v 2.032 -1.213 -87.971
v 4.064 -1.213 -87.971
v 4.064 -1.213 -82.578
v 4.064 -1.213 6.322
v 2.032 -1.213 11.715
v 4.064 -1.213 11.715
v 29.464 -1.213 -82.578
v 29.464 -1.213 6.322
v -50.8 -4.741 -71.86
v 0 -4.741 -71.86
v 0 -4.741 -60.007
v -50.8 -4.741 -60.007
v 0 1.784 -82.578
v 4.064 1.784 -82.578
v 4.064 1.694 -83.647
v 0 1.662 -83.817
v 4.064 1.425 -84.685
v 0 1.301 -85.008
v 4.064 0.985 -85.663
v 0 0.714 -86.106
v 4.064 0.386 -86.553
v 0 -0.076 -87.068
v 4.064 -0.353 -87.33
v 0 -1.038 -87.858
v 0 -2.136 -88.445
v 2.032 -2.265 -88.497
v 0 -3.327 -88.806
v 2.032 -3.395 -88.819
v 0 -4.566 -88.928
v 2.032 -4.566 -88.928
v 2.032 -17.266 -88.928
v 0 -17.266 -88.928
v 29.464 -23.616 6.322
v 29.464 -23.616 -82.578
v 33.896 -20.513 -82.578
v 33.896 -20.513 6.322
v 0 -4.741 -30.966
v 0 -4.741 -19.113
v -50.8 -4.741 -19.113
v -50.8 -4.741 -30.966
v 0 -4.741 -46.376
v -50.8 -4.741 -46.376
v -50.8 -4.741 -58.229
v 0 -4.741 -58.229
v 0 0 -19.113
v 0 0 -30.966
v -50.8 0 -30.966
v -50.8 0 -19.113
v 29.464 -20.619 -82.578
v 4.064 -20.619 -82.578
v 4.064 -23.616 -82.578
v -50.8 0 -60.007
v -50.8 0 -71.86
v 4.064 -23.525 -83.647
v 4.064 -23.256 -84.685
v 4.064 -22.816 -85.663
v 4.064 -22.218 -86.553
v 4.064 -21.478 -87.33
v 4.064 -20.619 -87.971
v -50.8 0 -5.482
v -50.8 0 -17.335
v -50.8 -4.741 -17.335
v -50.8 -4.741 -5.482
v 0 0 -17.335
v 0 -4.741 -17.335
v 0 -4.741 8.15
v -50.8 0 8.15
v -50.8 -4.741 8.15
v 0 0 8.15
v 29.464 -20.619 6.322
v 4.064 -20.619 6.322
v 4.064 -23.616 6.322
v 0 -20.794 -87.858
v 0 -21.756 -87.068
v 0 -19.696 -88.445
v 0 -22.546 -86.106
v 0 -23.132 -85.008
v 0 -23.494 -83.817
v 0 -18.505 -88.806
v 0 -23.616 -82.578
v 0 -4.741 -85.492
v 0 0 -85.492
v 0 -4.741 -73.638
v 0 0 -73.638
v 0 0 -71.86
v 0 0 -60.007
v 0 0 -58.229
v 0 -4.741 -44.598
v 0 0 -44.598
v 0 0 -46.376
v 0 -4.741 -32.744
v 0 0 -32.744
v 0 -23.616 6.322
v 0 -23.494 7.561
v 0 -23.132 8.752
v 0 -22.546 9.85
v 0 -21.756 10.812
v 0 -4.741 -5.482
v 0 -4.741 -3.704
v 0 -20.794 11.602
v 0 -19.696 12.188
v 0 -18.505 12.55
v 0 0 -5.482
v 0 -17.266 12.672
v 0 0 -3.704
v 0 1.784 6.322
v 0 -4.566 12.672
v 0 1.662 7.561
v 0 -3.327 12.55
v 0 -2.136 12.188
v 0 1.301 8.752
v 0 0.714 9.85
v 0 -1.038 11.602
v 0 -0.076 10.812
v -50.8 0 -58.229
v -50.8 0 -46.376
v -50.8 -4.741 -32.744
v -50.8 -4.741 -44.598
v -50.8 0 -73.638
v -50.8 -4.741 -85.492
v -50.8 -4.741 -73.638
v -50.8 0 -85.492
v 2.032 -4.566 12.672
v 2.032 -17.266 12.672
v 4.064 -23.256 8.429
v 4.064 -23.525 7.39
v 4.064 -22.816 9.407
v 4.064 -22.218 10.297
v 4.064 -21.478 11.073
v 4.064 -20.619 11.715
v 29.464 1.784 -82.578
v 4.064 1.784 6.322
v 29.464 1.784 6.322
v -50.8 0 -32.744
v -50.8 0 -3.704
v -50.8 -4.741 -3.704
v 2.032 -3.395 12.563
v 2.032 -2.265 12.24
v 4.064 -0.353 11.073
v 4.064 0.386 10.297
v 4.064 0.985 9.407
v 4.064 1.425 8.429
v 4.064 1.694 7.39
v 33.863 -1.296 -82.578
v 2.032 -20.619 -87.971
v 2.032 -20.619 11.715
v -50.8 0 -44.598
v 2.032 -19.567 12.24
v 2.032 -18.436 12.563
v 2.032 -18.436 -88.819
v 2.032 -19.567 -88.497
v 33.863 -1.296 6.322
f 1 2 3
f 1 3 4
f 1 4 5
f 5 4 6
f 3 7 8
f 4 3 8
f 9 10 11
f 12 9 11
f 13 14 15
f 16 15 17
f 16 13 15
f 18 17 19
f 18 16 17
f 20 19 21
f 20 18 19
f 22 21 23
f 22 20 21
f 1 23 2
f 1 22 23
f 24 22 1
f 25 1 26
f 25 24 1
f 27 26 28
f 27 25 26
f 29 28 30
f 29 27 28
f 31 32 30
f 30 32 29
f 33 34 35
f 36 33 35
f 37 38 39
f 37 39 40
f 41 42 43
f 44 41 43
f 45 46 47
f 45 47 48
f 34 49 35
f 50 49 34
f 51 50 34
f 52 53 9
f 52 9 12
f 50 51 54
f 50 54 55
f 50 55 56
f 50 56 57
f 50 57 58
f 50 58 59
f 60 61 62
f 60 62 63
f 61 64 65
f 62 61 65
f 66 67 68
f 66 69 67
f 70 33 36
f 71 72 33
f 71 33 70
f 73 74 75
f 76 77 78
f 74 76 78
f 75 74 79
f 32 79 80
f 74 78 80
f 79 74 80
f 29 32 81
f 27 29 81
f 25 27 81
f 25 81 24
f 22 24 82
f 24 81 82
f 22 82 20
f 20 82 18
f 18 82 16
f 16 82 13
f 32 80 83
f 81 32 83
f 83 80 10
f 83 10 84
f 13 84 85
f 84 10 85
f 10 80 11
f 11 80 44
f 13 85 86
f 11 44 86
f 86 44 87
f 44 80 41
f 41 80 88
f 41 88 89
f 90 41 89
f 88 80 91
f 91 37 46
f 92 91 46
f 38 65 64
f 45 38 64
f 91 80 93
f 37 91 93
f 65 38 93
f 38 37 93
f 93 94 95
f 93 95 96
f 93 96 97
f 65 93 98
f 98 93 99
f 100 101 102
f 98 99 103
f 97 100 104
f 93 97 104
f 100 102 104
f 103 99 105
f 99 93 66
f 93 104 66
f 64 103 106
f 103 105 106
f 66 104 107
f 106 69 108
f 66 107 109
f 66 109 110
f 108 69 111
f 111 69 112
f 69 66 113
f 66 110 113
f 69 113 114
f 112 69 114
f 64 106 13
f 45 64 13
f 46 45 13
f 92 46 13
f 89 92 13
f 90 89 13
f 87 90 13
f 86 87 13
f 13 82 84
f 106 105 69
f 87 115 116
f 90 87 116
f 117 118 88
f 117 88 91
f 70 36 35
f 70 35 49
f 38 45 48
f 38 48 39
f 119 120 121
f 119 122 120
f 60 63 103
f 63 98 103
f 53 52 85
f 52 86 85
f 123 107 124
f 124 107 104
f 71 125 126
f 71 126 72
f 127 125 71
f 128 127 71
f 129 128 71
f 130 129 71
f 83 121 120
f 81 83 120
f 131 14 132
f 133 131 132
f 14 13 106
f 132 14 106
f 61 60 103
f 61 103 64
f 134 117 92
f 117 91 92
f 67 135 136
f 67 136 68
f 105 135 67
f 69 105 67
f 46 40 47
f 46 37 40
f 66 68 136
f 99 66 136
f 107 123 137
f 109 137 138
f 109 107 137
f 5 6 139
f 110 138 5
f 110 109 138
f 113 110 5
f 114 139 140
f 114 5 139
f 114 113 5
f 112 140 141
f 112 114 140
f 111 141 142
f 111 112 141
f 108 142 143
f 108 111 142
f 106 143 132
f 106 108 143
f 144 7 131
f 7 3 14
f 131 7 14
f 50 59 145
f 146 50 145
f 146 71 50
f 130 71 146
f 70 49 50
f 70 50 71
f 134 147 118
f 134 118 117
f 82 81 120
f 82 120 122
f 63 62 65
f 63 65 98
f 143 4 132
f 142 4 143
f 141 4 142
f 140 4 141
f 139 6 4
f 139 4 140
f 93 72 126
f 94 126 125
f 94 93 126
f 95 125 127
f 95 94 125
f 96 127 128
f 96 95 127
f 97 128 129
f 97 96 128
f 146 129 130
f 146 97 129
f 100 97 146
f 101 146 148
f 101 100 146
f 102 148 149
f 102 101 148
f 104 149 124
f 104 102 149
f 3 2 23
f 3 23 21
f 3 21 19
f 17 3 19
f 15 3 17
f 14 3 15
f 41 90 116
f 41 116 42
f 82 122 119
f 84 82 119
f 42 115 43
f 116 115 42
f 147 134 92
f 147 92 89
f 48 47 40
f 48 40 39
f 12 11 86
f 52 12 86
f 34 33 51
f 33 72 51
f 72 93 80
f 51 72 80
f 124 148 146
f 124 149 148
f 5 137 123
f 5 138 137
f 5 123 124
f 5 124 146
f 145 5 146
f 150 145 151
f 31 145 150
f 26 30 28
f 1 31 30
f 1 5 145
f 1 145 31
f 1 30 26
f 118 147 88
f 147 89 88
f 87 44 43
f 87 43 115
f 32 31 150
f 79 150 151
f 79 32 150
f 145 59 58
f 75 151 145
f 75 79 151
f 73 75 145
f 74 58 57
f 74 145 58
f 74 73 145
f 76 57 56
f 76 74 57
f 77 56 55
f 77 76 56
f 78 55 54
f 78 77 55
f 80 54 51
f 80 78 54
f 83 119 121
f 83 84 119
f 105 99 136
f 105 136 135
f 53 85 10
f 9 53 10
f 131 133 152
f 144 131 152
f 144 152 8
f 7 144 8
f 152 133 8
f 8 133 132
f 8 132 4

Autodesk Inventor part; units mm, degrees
ref_plane "YZ Plane" through (0, 0, 0) normal (1, 0, 0) x (0, 1, 0)
ref_plane "XZ Plane" through (0, 0, 0) normal (0, 1, 0) x (-1, 0, 0)
ref_plane "XY Plane" through (0, 0, 0) normal (0, 0, 1) x (1, 0, 0)
sketch "Sketch1" plane through (0, 0, 0) normal (1, 0, 0) x (0, 1, 0)
  line L0 (-4.5658, 12.6718) -> (-17.2658, 12.6718)
  line L1 (-23.6158, 6.3218) -> (-23.6158, -82.5782)
  line L2 (-17.2658, -88.9282) -> (-4.5658, -88.9282)
  line L3 (1.7842, -82.5782) -> (1.7842, 6.3218)
  arc A0 (1.7842, 6.3218) -> (-4.5658, 12.6718) centre (-4.5658, 6.3218) ccw
  arc A1 (-17.2658, 12.6718) -> (-23.6158, 6.3218) centre (-17.2658, 6.3218) ccw
  arc A2 (-23.6158, -82.5782) -> (-17.2658, -88.9282) centre (-17.2658, -82.5782) ccw
  arc A3 (-4.5658, -88.9282) -> (1.7842, -82.5782) centre (-4.5658, -82.5782) ccw
  point P0 (0, 0)
  point P1 (1.7842, 12.6718)
  point P2 (-23.6158, -88.9282)
  point P3 (-23.6158, 12.6718)
  point P4 (1.7842, -88.9282)
  dimension "d0" = 25.4
  dimension "d1" = 101.6
  dimension "d4" = 6.35
extrude "Extrusion1" add sketch "Sketch1" along normal blind 4.064
sketch "Sketch2" plane through (4.064, 0, 0) normal (1, 0, 0) x (0, 0, -1)
  arc A0 (82.5782, -23.6158) -> (88.9282, -17.2658) centre (82.5782, -17.2658) ccw projected
  line L0 (-12.6718, -4.5658) -> (-12.6718, -17.2658) projected
  line L1 (82.5782, 1.7842) -> (-6.3218, 1.7842) projected
  line L2 (82.5782, -1.213) -> (-6.3218, -1.213)
  line L3 (-6.3218, -20.6186) -> (82.5782, -20.6186)
  line L4 (-6.3218, -20.6186) -> (82.5782, -20.6186)
  line L5 (82.5782, -20.6186) -> (82.5782, -23.6158)
  line L6 (82.5782, -23.6158) -> (-6.3218, -23.6158)
  line L7 (-6.3218, -23.6158) -> (-6.3218, -20.6186)
  line L8 (-6.3218, -1.213) -> (82.5782, -1.213)
  line L9 (82.5782, -1.213) -> (82.5782, 1.7842)
  line L10 (82.5782, 1.7842) -> (-6.3218, 1.7842)
  line L11 (-6.3218, 1.7842) -> (-6.3218, -1.213)
  point P0 (0, 0)
  dimension "d6" = 19.4056
extrude "Extrusion2" add sketch "Sketch2" along normal blind 25.4
sketch "Sketch3" plane through (4.064, -1.213, 6.3218) normal (0, 0, 1) x (1, 0, 0)
  line L0 (25.4, 2.9972) -> (25.4, 0) projected
  line L1 (25.4, 2.9972) -> (25.4, 0)
  line L2 (25.4, -19.4056) -> (25.4, -22.4028) projected
  line L3 (25.4, -22.4028) -> (29.8318, -19.2996)
  line L4 (25.4, -19.4056) -> (25.4, -22.4028)
  line L5 (0, 2.9972) -> (25.4, 2.9972) projected
  line L6 (25.4, 2.9972) -> (25.4, 0)
  line L7 (25.4, 2.9972) -> (29.8318, -0.106)
  line L8 (29.7989, -0.0829) -> (25.4, 0)
  line L9 (29.8318, -19.2996) -> (25.4, -19.4056)
  point P0 (-4.064, 1.213)
  dimension "d35" = 5.4102
  dimension "d36" = 55
  dimension "d37" = 5.4102
  dimension "d38" = 55
sketch "Sketch4" plane through (0, 0, 0) normal (-1, 0, 0) x (0, 0, 1)
  arc A0 (12.6718, -4.5658) -> (6.3218, 1.7842) centre (6.3218, -4.5658) ccw projected
  line L0 (-5.4816, 0) -> (-17.3349, 0)
  line L1 (-17.3349, 0) -> (-17.3349, -4.7413)
  line L2 (-17.3349, -4.7413) -> (-5.4816, -4.7413)
  line L3 (-5.4816, -4.7413) -> (-5.4816, 0)
  line L4 (-30.9663, 0) -> (-19.1129, 0)
  line L5 (-19.1129, 0) -> (-19.1129, -4.7413)
  line L6 (-19.1129, -4.7413) -> (-30.9663, -4.7413)
  line L7 (-30.9663, -4.7413) -> (-30.9663, 0)
  line L8 (-32.7443, 0) -> (-44.5976, 0)
  line L9 (-44.5976, -4.7413) -> (-32.7443, -4.7413)
  line L10 (-32.7443, -4.7413) -> (-32.7443, 0)
  line L11 (-44.5976, 0) -> (-44.5976, -4.7413)
  arc A1 (-82.5782, 1.7842) -> (-88.9282, -4.5658) centre (-82.5782, -4.5658) ccw projected
  line L12 (-58.2289, -4.7413) -> (-58.2289, 0)
  line L13 (-58.2289, 0) -> (-46.3756, 0)
  line L14 (-46.3756, -4.7413) -> (-58.2289, -4.7413)
  line L15 (-46.3756, 0) -> (-46.3756, -4.7413)
  line L16 (-60.0069, 0) -> (-71.8603, 0)
  line L17 (-71.8603, 0) -> (-71.8603, -4.7413)
  line L18 (-71.8603, -4.7413) -> (-60.0069, -4.7413)
  line L19 (-60.0069, -4.7413) -> (-60.0069, 0)
  line L20 (-85.4916, 0) -> (-73.6383, 0)
  line L21 (-73.6383, 0) -> (-73.6383, -4.7413)
  line L22 (-85.4916, -4.7413) -> (-85.4916, 0)
  line L23 (-73.6383, -4.7413) -> (-85.4916, -4.7413)
  line L24 (-3.7036, 0) -> (8.1497, 0)
  line L25 (8.1497, 0) -> (8.1497, -4.7413)
  line L26 (8.1497, -4.7413) -> (-3.7036, -4.7413)
  line L27 (-3.7036, -4.7413) -> (-3.7036, 0)
  point P0 (0, 0)
  dimension "d47" = 1.778
extrude "Extrusion4" add sketch "Sketch4" along normal blind 50.8
extrude "Extrusion6" add sketch "Sketch3" against normal up to surface (88.9 mm away)
sketch "Sketch8" plane through (0, -23.6158, -82.5782) normal (0, -1, 0) x (1, 0, 0)
  point P0 (0, 82.5782)
sketch "Sketch9" plane through (0, -23.6158, -82.5782) normal (0, -1, 0) x (1, 0, 0)
  line L0 (29.0881, 73.7677) -> (29.0881, 12.702) construction
  line L1 (29.0881, 12.702) -> (2.3767, 12.702) construction
  line L2 (2.3767, 12.702) -> (2.3767, 73.7677) construction
  line L3 (2.3767, 73.7677) -> (29.0881, 73.7677) construction
  point P0 (0, 82.5782)
emboss "Emboss2" [suppressed]
sketch "Sketch10" plane through (4.064, 0, 0) normal (1, 0, 0) x (0, 0, -1)
  line L0 (-6.3218, -20.6186) -> (82.5782, -20.6186) projected
  line L1 (82.5782, 1.7842) -> (82.5782, -1.213) projected
  line L2 (-6.3218, -1.213) -> (-6.3218, 1.7842) projected
  line L3 (82.5782, -1.213) -> (-6.3218, -1.213)
  line L4 (-6.3218, -20.6186) -> (82.5782, -20.6186)
  line L5 (82.5782, -20.6186) -> (87.9709, -20.6186)
  arc A0 (82.5782, -23.6158) -> (88.9282, -17.2658) centre (82.5782, -17.2658) ccw projected
  line L6 (82.5782, -1.213) -> (87.9709, -1.213)
  arc A1 (88.9282, -4.5658) -> (82.5782, 1.7842) centre (82.5782, -4.5658) ccw projected
  line L7 (-6.3218, -20.6186) -> (82.5782, -20.6186) projected
  line L8 (-6.3218, -20.6186) -> (-11.7145, -20.6186)
  arc A2 (-12.6718, -17.2658) -> (-6.3218, -23.6158) centre (-6.3218, -17.2658) ccw projected
  line L9 (-6.3218, -1.213) -> (-11.7145, -1.213)
  line L10 (87.9709, -1.213) -> (88.9282, -1.213)
  line L11 (88.9282, -1.213) -> (88.9282, -20.6186)
  line L12 (88.9282, -20.6186) -> (87.9709, -20.6186)
  line L13 (-11.7145, -20.6186) -> (-12.6718, -20.6186)
  line L14 (-12.6718, -20.6186) -> (-12.6718, -1.213)
  line L15 (-12.6718, -1.213) -> (-11.7145, -1.213)
  arc A3 (-6.3218, 1.7842) -> (-12.6718, -4.5658) centre (-6.3218, -4.5658) ccw projected
  point P0 (0, 0)
  point P1 (42.8061, -20.6186)
  point P2 (29.4692, -20.6186)
  point P3 (42.8061, -20.6186)
extrude "Extrusion7" cut sketch "Sketch10" against normal blind 2.032 contours L8 A2 L14 A3 L9 L3 L6 A1 L11 A0 L5 L0 | L13 L14 A2 | A0 L11 L12 | L14 L15 A3 | A1 L10 L11
properties part number "the whole thing"
